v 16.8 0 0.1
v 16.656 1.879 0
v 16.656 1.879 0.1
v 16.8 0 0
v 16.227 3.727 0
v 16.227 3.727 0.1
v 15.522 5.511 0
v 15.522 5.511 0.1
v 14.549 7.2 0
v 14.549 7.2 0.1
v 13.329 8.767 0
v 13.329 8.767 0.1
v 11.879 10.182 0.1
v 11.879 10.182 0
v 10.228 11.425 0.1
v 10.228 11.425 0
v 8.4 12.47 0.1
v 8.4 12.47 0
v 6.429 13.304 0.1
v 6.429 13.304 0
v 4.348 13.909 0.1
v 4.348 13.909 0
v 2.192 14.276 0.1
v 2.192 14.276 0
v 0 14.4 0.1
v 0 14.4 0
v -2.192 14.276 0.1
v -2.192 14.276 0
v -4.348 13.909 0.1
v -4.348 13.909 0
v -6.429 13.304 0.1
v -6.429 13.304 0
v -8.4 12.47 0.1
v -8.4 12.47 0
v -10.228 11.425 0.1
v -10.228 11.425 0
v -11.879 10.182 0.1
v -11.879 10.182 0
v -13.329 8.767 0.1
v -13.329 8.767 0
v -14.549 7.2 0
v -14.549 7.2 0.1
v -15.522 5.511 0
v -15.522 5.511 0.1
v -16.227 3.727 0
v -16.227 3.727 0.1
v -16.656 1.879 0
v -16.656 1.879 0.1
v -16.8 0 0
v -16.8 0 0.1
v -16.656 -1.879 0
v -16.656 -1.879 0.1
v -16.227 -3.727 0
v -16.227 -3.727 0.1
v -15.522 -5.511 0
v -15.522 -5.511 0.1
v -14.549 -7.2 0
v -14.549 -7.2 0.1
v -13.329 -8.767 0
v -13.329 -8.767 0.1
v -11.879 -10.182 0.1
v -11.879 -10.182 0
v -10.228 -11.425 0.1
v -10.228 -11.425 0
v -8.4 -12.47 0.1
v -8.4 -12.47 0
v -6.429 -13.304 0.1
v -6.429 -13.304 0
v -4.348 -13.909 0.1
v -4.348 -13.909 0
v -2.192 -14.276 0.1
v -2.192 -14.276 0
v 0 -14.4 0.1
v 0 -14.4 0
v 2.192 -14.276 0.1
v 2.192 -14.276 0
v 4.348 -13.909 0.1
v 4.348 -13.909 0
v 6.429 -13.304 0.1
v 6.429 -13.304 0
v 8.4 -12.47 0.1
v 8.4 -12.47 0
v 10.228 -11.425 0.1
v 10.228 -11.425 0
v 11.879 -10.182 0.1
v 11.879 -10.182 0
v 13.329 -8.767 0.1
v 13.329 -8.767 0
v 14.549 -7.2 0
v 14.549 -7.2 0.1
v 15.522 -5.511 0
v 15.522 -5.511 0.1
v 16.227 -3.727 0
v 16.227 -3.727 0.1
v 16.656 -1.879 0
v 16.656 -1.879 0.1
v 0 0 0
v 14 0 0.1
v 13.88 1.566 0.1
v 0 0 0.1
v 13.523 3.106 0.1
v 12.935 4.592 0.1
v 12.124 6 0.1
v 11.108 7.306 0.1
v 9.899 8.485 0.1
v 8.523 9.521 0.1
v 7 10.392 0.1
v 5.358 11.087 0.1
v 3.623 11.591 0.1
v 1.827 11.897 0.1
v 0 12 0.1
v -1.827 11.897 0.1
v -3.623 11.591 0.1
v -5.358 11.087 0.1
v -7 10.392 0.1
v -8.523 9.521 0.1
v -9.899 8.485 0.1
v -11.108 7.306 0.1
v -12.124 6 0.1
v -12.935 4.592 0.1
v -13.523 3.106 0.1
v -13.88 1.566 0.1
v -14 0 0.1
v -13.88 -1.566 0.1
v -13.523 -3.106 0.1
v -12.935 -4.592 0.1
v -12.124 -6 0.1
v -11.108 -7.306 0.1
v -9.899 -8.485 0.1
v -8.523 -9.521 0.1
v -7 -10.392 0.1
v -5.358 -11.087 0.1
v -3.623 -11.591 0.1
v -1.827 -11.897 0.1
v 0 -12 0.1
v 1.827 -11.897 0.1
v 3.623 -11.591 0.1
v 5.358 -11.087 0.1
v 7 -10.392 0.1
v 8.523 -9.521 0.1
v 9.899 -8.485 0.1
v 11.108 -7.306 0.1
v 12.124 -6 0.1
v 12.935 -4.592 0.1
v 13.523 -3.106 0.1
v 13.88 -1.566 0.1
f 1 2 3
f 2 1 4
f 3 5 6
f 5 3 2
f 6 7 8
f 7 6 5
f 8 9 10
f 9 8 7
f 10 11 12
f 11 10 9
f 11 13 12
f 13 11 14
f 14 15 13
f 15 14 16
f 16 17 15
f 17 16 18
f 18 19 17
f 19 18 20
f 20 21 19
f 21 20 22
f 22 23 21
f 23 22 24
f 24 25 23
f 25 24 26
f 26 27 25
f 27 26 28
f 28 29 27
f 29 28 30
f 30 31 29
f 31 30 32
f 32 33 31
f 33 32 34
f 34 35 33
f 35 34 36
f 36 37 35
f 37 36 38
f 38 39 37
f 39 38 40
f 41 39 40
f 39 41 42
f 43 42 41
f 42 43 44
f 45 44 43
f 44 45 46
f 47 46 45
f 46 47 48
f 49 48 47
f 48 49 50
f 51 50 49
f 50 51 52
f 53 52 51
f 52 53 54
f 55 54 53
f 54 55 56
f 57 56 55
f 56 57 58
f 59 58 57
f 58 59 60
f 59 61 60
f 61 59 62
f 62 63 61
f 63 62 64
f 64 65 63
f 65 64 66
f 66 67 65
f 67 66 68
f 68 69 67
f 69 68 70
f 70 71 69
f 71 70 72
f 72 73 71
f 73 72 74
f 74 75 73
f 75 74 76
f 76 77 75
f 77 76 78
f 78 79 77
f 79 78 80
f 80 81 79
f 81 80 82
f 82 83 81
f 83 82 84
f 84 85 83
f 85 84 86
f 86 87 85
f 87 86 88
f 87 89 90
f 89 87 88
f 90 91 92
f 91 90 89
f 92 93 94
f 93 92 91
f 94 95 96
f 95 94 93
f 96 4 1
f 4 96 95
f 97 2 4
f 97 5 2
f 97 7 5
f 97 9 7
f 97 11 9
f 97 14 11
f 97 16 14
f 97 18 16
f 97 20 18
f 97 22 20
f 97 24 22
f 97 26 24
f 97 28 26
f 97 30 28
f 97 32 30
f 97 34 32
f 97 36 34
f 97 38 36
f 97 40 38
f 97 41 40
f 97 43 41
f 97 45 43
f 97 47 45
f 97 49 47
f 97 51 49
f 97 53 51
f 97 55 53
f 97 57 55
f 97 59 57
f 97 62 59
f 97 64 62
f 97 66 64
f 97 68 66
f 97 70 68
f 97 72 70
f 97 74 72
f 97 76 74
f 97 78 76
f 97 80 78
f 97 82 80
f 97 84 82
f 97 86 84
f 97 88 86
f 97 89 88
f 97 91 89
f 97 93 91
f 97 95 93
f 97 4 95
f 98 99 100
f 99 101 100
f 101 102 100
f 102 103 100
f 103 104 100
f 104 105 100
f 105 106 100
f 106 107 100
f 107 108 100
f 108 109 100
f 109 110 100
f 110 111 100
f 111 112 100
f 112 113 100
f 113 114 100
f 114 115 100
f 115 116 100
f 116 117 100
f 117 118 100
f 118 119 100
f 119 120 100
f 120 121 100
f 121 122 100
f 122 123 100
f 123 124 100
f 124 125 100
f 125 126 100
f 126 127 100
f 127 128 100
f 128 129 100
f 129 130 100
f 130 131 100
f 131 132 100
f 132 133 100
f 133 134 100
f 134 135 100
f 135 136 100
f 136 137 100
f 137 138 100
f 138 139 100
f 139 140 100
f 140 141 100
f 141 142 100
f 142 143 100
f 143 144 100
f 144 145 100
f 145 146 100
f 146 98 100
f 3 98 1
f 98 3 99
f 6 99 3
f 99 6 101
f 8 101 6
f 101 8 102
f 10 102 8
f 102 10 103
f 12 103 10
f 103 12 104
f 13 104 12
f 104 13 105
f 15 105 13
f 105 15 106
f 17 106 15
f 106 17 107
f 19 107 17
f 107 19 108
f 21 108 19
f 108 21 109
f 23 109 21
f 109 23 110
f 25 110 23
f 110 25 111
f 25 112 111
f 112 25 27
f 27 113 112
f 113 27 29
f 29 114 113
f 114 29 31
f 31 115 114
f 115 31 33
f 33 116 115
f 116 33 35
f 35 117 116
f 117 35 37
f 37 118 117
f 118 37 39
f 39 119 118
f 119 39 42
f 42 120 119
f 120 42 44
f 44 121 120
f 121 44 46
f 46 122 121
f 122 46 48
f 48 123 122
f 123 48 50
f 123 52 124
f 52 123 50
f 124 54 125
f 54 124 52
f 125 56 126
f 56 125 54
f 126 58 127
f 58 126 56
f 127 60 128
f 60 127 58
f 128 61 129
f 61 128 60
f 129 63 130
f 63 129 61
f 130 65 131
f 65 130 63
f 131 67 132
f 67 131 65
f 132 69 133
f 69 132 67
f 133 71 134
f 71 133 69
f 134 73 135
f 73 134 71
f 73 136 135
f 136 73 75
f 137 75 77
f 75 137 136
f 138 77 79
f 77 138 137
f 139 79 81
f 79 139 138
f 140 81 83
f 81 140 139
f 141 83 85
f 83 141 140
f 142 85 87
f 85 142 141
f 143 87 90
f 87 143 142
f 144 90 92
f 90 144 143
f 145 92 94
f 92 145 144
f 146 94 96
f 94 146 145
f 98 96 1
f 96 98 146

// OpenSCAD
// file: ../p/48/1-4cyli.scad
use <../../lib.scad>
function ldraw_lib__48__1_4cyli() = [
// 0 Hi-Res Cylinder 0.25
// 0 Name: 48\1-4cyli.dat
// 0 Author: Manfred Moolhuysen
// 0 !LDRAW_ORG 48_Primitive UPDATE 2009-01
// 0 !LICENSE Licensed under CC BY 2.0 and CC BY 4.0 : see CAreadme.txt
// 
// 0 BFC CERTIFY CCW
  [0,"BFC","CERTIFY"],
  [0,"BFC","CCW"],
// 
// 0 !HISTORY 1999-07-05 [PTadmin] Official Update 1999-05
// 0 !HISTORY 2002-02-28 [hafhead] Added BFC statement
// 0 !HISTORY 2002-04-25 [PTadmin] Official Update 2002-02
// 0 !HISTORY 2007-06-24 [PTadmin] Header formatted for Contributor Agreement
// 0 !HISTORY 2008-07-01 [PTadmin] Official Update 2008-01
// 0 !HISTORY 2008-07-07 [guyvivan] Made BFC'ed CCW (2005-12-06)
// 0 !HISTORY 2009-05-02 [PTadmin] Official Update 2009-01
// 
// 
// 4 16 0.9914 0 0.1305 1 0 0 1 1 0 0.9914 1 0.1305
  [4,16,0.9914,0,0.1305,1,0,0,1,1,0,0.9914,1,0.1305],
// 4 16 0.9659 0 0.2588 0.9914 0 0.1305 0.9914 1 0.1305 0.9659 1 0.2588
  [4,16,0.9659,0,0.2588,0.9914,0,0.1305,0.9914,1,0.1305,0.9659,1,0.2588],
// 4 16 0.9239 0 0.3827 0.9659 0 0.2588 0.9659 1 0.2588 0.9239 1 0.3827
  [4,16,0.9239,0,0.3827,0.9659,0,0.2588,0.9659,1,0.2588,0.9239,1,0.3827],
// 4 16 0.866 0 0.5 0.9239 0 0.3827 0.9239 1 0.3827 0.866 1 0.5
  [4,16,0.866,0,0.5,0.9239,0,0.3827,0.9239,1,0.3827,0.866,1,0.5],
// 4 16 0.7934 0 0.6088 0.866 0 0.5 0.866 1 0.5 0.7934 1 0.6088
  [4,16,0.7934,0,0.6088,0.866,0,0.5,0.866,1,0.5,0.7934,1,0.6088],
// 4 16 0.7071 0 0.7071 0.7934 0 0.6088 0.7934 1 0.6088 0.7071 1 0.7071
  [4,16,0.7071,0,0.7071,0.7934,0,0.6088,0.7934,1,0.6088,0.7071,1,0.7071],
// 4 16 0.6088 0 0.7934 0.7071 0 0.7071 0.7071 1 0.7071 0.6088 1 0.7934
  [4,16,0.6088,0,0.7934,0.7071,0,0.7071,0.7071,1,0.7071,0.6088,1,0.7934],
// 4 16 0.5 0 0.866 0.6088 0 0.7934 0.6088 1 0.7934 0.5 1 0.866
  [4,16,0.5,0,0.866,0.6088,0,0.7934,0.6088,1,0.7934,0.5,1,0.866],
// 4 16 0.3827 0 0.9239 0.5 0 0.866 0.5 1 0.866 0.3827 1 0.9239
  [4,16,0.3827,0,0.9239,0.5,0,0.866,0.5,1,0.866,0.3827,1,0.9239],
// 4 16 0.2588 0 0.9659 0.3827 0 0.9239 0.3827 1 0.9239 0.2588 1 0.9659
  [4,16,0.2588,0,0.9659,0.3827,0,0.9239,0.3827,1,0.9239,0.2588,1,0.9659],
// 4 16 0.1305 0 0.9914 0.2588 0 0.9659 0.2588 1 0.9659 0.1305 1 0.9914
  [4,16,0.1305,0,0.9914,0.2588,0,0.9659,0.2588,1,0.9659,0.1305,1,0.9914],
// 4 16 0 0 1 0.1305 0 0.9914 0.1305 1 0.9914 0 1 1
  [4,16,0,0,1,0.1305,0,0.9914,0.1305,1,0.9914,0,1,1],
// 
// 0 conditional lines
// 5 24 1 1 0 1 0 0 1 1 -1 0.9914 1 0.1305
  [5,24,1,1,0,1,0,0,1,1,-1,0.9914,1,0.1305],
// 5 24 0.9914 1 0.1305 0.9914 0 0.1305 1 1 0 0.9659 1 0.2588
  [5,24,0.9914,1,0.1305,0.9914,0,0.1305,1,1,0,0.9659,1,0.2588],
// 5 24 0.9659 1 0.2588 0.9659 0 0.2588 0.9914 1 0.1305 0.9239 1 0.3827
  [5,24,0.9659,1,0.2588,0.9659,0,0.2588,0.9914,1,0.1305,0.9239,1,0.3827],
// 5 24 0.9239 1 0.3827 0.9239 0 0.3827 0.9659 1 0.2588 0.866 1 0.5
  [5,24,0.9239,1,0.3827,0.9239,0,0.3827,0.9659,1,0.2588,0.866,1,0.5],
// 5 24 0.866 1 0.5 0.866 0 0.5 0.9239 1 0.3827 0.7934 1 0.6088
  [5,24,0.866,1,0.5,0.866,0,0.5,0.9239,1,0.3827,0.7934,1,0.6088],
// 5 24 0.7934 1 0.6088 0.7934 0 0.6088 0.866 1 0.5 0.7071 1 0.7071
  [5,24,0.7934,1,0.6088,0.7934,0,0.6088,0.866,1,0.5,0.7071,1,0.7071],
// 5 24 0.7071 1 0.7071 0.7071 0 0.7071 0.7934 1 0.6088 0.6088 1 0.7934
  [5,24,0.7071,1,0.7071,0.7071,0,0.7071,0.7934,1,0.6088,0.6088,1,0.7934],
// 5 24 0.6088 1 0.7934 0.6088 0 0.7934 0.7071 1 0.7071 0.5 1 0.866
  [5,24,0.6088,1,0.7934,0.6088,0,0.7934,0.7071,1,0.7071,0.5,1,0.866],
// 5 24 0.5 1 0.866 0.5 0 0.866 0.6088 1 0.7934 0.3827 1 0.9239
  [5,24,0.5,1,0.866,0.5,0,0.866,0.6088,1,0.7934,0.3827,1,0.9239],
// 5 24 0.3827 1 0.9239 0.3827 0 0.9239 0.5 1 0.866 0.2588 1 0.9659
  [5,24,0.3827,1,0.9239,0.3827,0,0.9239,0.5,1,0.866,0.2588,1,0.9659],
// 5 24 0.2588 1 0.9659 0.2588 0 0.9659 0.3827 1 0.9239 0.1305 1 0.9914
  [5,24,0.2588,1,0.9659,0.2588,0,0.9659,0.3827,1,0.9239,0.1305,1,0.9914],
// 5 24 0.1305 1 0.9914 0.1305 0 0.9914 0.2588 1 0.9659 0 1 1
  [5,24,0.1305,1,0.9914,0.1305,0,0.9914,0.2588,1,0.9659,0,1,1],
// 5 24 0 1 1 0 0 1 0.1305 1 0.9914 -1 1 1
  [5,24,0,1,1,0,0,1,0.1305,1,0.9914,-1,1,1],
// 
// 0 end of file
];
module ldraw_lib__48__1_4cyli(step=0, col=false, unit=2/5, alt=false, line=0.2, solid=!$preview)
    makepoly(ldraw_lib__48__1_4cyli(), step=step, col=col, unit=unit, alt=alt, line=line, solid=solid);
ldraw_lib__48__1_4cyli(line=0.2);
// file: ../p/48/4-4ring5.scad
use <../../lib.scad>
function ldraw_lib__48__4_4ring5() = [
// 0 Hi-Res Ring  5 x 1.0
// 0 Name: 48\4-4ring5.dat
// 0 Author: Guy Vivan [guyvivan]
// 0 !LDRAW_ORG 48_Primitive UPDATE 2009-03
// 0 !LICENSE Licensed under CC BY 2.0 and CC BY 4.0 : see CAreadme.txt
// 
// 0 BFC CERTIFY CCW
  [0,"BFC","CERTIFY"],
  [0,"BFC","CCW"],
// 
// 0 !HISTORY 2009-12-29 [PTadmin] Official Update 2009-03
// 
// 
// 4 16 5 0 0 6 0 0 5.9484 0 0.783 4.957 0 0.6525
  [4,16,5,0,0,6,0,0,5.9484,0,0.783,4.957,0,0.6525],
// 4 16 4.957 0 0.6525 5.9484 0 0.783 5.7954 0 1.5528 4.8295 0 1.294
  [4,16,4.957,0,0.6525,5.9484,0,0.783,5.7954,0,1.5528,4.8295,0,1.294],
// 4 16 4.8295 0 1.294 5.7954 0 1.5528 5.5434 0 2.2962 4.6195 0 1.9135
  [4,16,4.8295,0,1.294,5.7954,0,1.5528,5.5434,0,2.2962,4.6195,0,1.9135],
// 4 16 4.6195 0 1.9135 5.5434 0 2.2962 5.196 0 3 4.33 0 2.5
  [4,16,4.6195,0,1.9135,5.5434,0,2.2962,5.196,0,3,4.33,0,2.5],
// 4 16 4.33 0 2.5 5.196 0 3 4.7604 0 3.6528 3.967 0 3.044
  [4,16,4.33,0,2.5,5.196,0,3,4.7604,0,3.6528,3.967,0,3.044],
// 4 16 3.967 0 3.044 4.7604 0 3.6528 4.2426 0 4.2426 3.5355 0 3.5355
  [4,16,3.967,0,3.044,4.7604,0,3.6528,4.2426,0,4.2426,3.5355,0,3.5355],
// 4 16 3.5355 0 3.5355 4.2426 0 4.2426 3.6528 0 4.7604 3.044 0 3.967
  [4,16,3.5355,0,3.5355,4.2426,0,4.2426,3.6528,0,4.7604,3.044,0,3.967],
// 4 16 3.044 0 3.967 3.6528 0 4.7604 3 0 5.196 2.5 0 4.33
  [4,16,3.044,0,3.967,3.6528,0,4.7604,3,0,5.196,2.5,0,4.33],
// 4 16 2.5 0 4.33 3 0 5.196 2.2962 0 5.5434 1.9135 0 4.6195
  [4,16,2.5,0,4.33,3,0,5.196,2.2962,0,5.5434,1.9135,0,4.6195],
// 4 16 1.9135 0 4.6195 2.2962 0 5.5434 1.5528 0 5.7954 1.294 0 4.8295
  [4,16,1.9135,0,4.6195,2.2962,0,5.5434,1.5528,0,5.7954,1.294,0,4.8295],
// 4 16 1.294 0 4.8295 1.5528 0 5.7954 0.783 0 5.9484 0.6525 0 4.957
  [4,16,1.294,0,4.8295,1.5528,0,5.7954,0.783,0,5.9484,0.6525,0,4.957],
// 4 16 0.6525 0 4.957 0.783 0 5.9484 0 0 6 0 0 5
  [4,16,0.6525,0,4.957,0.783,0,5.9484,0,0,6,0,0,5],
// 4 16 0 0 5 0 0 6 -0.783 0 5.9484 -0.6525 0 4.957
  [4,16,0,0,5,0,0,6,-0.783,0,5.9484,-0.6525,0,4.957],
// 4 16 -0.6525 0 4.957 -0.783 0 5.9484 -1.5528 0 5.7954 -1.294 0 4.8295
  [4,16,-0.6525,0,4.957,-0.783,0,5.9484,-1.5528,0,5.7954,-1.294,0,4.8295],
// 4 16 -1.294 0 4.8295 -1.5528 0 5.7954 -2.2962 0 5.5434 -1.9135 0 4.6195
  [4,16,-1.294,0,4.8295,-1.5528,0,5.7954,-2.2962,0,5.5434,-1.9135,0,4.6195],
// 4 16 -1.9135 0 4.6195 -2.2962 0 5.5434 -3 0 5.196 -2.5 0 4.33
  [4,16,-1.9135,0,4.6195,-2.2962,0,5.5434,-3,0,5.196,-2.5,0,4.33],
// 4 16 -2.5 0 4.33 -3 0 5.196 -3.6528 0 4.7604 -3.044 0 3.967
  [4,16,-2.5,0,4.33,-3,0,5.196,-3.6528,0,4.7604,-3.044,0,3.967],
// 4 16 -3.044 0 3.967 -3.6528 0 4.7604 -4.2426 0 4.2426 -3.5355 0 3.5355
  [4,16,-3.044,0,3.967,-3.6528,0,4.7604,-4.2426,0,4.2426,-3.5355,0,3.5355],
// 4 16 -3.5355 0 3.5355 -4.2426 0 4.2426 -4.7604 0 3.6528 -3.967 0 3.044
  [4,16,-3.5355,0,3.5355,-4.2426,0,4.2426,-4.7604,0,3.6528,-3.967,0,3.044],
// 4 16 -3.967 0 3.044 -4.7604 0 3.6528 -5.196 0 3 -4.33 0 2.5
  [4,16,-3.967,0,3.044,-4.7604,0,3.6528,-5.196,0,3,-4.33,0,2.5],
// 4 16 -4.33 0 2.5 -5.196 0 3 -5.5434 0 2.2962 -4.6195 0 1.9135
  [4,16,-4.33,0,2.5,-5.196,0,3,-5.5434,0,2.2962,-4.6195,0,1.9135],
// 4 16 -4.6195 0 1.9135 -5.5434 0 2.2962 -5.7954 0 1.5528 -4.8295 0 1.294
  [4,16,-4.6195,0,1.9135,-5.5434,0,2.2962,-5.7954,0,1.5528,-4.8295,0,1.294],
// 4 16 -4.8295 0 1.294 -5.7954 0 1.5528 -5.9484 0 0.783 -4.957 0 0.6525
  [4,16,-4.8295,0,1.294,-5.7954,0,1.5528,-5.9484,0,0.783,-4.957,0,0.6525],
// 4 16 -4.957 0 0.6525 -5.9484 0 0.783 -6 0 0 -5 0 0
  [4,16,-4.957,0,0.6525,-5.9484,0,0.783,-6,0,0,-5,0,0],
// 4 16 -5 0 0 -6 0 0 -5.9484 0 -0.783 -4.957 0 -0.6525
  [4,16,-5,0,0,-6,0,0,-5.9484,0,-0.783,-4.957,0,-0.6525],
// 4 16 -4.957 0 -0.6525 -5.9484 0 -0.783 -5.7954 0 -1.5528 -4.8295 0 -1.294
  [4,16,-4.957,0,-0.6525,-5.9484,0,-0.783,-5.7954,0,-1.5528,-4.8295,0,-1.294],
// 4 16 -4.8295 0 -1.294 -5.7954 0 -1.5528 -5.5434 0 -2.2962 -4.6195 0 -1.9135
  [4,16,-4.8295,0,-1.294,-5.7954,0,-1.5528,-5.5434,0,-2.2962,-4.6195,0,-1.9135],
// 4 16 -4.6195 0 -1.9135 -5.5434 0 -2.2962 -5.196 0 -3 -4.33 0 -2.5
  [4,16,-4.6195,0,-1.9135,-5.5434,0,-2.2962,-5.196,0,-3,-4.33,0,-2.5],
// 4 16 -4.33 0 -2.5 -5.196 0 -3 -4.7604 0 -3.6528 -3.967 0 -3.044
  [4,16,-4.33,0,-2.5,-5.196,0,-3,-4.7604,0,-3.6528,-3.967,0,-3.044],
// 4 16 -3.967 0 -3.044 -4.7604 0 -3.6528 -4.2426 0 -4.2426 -3.5355 0 -3.5355
  [4,16,-3.967,0,-3.044,-4.7604,0,-3.6528,-4.2426,0,-4.2426,-3.5355,0,-3.5355],
// 4 16 -3.5355 0 -3.5355 -4.2426 0 -4.2426 -3.6528 0 -4.7604 -3.044 0 -3.967
  [4,16,-3.5355,0,-3.5355,-4.2426,0,-4.2426,-3.6528,0,-4.7604,-3.044,0,-3.967],
// 4 16 -3.044 0 -3.967 -3.6528 0 -4.7604 -3 0 -5.196 -2.5 0 -4.33
  [4,16,-3.044,0,-3.967,-3.6528,0,-4.7604,-3,0,-5.196,-2.5,0,-4.33],
// 4 16 -2.5 0 -4.33 -3 0 -5.196 -2.2962 0 -5.5434 -1.9135 0 -4.6195
  [4,16,-2.5,0,-4.33,-3,0,-5.196,-2.2962,0,-5.5434,-1.9135,0,-4.6195],
// 4 16 -1.9135 0 -4.6195 -2.2962 0 -5.5434 -1.5528 0 -5.7954 -1.294 0 -4.8295
  [4,16,-1.9135,0,-4.6195,-2.2962,0,-5.5434,-1.5528,0,-5.7954,-1.294,0,-4.8295],
// 4 16 -1.294 0 -4.8295 -1.5528 0 -5.7954 -0.783 0 -5.9484 -0.6525 0 -4.957
  [4,16,-1.294,0,-4.8295,-1.5528,0,-5.7954,-0.783,0,-5.9484,-0.6525,0,-4.957],
// 4 16 -0.6525 0 -4.957 -0.783 0 -5.9484 0 0 -6 0 0 -5
  [4,16,-0.6525,0,-4.957,-0.783,0,-5.9484,0,0,-6,0,0,-5],
// 4 16 0 0 -5 0 0 -6 0.783 0 -5.9484 0.6525 0 -4.957
  [4,16,0,0,-5,0,0,-6,0.783,0,-5.9484,0.6525,0,-4.957],
// 4 16 0.6525 0 -4.957 0.783 0 -5.9484 1.5528 0 -5.7954 1.294 0 -4.8295
  [4,16,0.6525,0,-4.957,0.783,0,-5.9484,1.5528,0,-5.7954,1.294,0,-4.8295],
// 4 16 1.294 0 -4.8295 1.5528 0 -5.7954 2.2962 0 -5.5434 1.9135 0 -4.6195
  [4,16,1.294,0,-4.8295,1.5528,0,-5.7954,2.2962,0,-5.5434,1.9135,0,-4.6195],
// 4 16 1.9135 0 -4.6195 2.2962 0 -5.5434 3 0 -5.196 2.5 0 -4.33
  [4,16,1.9135,0,-4.6195,2.2962,0,-5.5434,3,0,-5.196,2.5,0,-4.33],
// 4 16 2.5 0 -4.33 3 0 -5.196 3.6528 0 -4.7604 3.044 0 -3.967
  [4,16,2.5,0,-4.33,3,0,-5.196,3.6528,0,-4.7604,3.044,0,-3.967],
// 4 16 3.044 0 -3.967 3.6528 0 -4.7604 4.2426 0 -4.2426 3.5355 0 -3.5355
  [4,16,3.044,0,-3.967,3.6528,0,-4.7604,4.2426,0,-4.2426,3.5355,0,-3.5355],
// 4 16 3.5355 0 -3.5355 4.2426 0 -4.2426 4.7604 0 -3.6528 3.967 0 -3.044
  [4,16,3.5355,0,-3.5355,4.2426,0,-4.2426,4.7604,0,-3.6528,3.967,0,-3.044],
// 4 16 3.967 0 -3.044 4.7604 0 -3.6528 5.196 0 -3 4.33 0 -2.5
  [4,16,3.967,0,-3.044,4.7604,0,-3.6528,5.196,0,-3,4.33,0,-2.5],
// 4 16 4.33 0 -2.5 5.196 0 -3 5.5434 0 -2.2962 4.6195 0 -1.9135
  [4,16,4.33,0,-2.5,5.196,0,-3,5.5434,0,-2.2962,4.6195,0,-1.9135],
// 4 16 4.6195 0 -1.9135 5.5434 0 -2.2962 5.7954 0 -1.5528 4.8295 0 -1.294
  [4,16,4.6195,0,-1.9135,5.5434,0,-2.2962,5.7954,0,-1.5528,4.8295,0,-1.294],
// 4 16 4.8295 0 -1.294 5.7954 0 -1.5528 5.9484 0 -0.783 4.957 0 -0.6525
  [4,16,4.8295,0,-1.294,5.7954,0,-1.5528,5.9484,0,-0.783,4.957,0,-0.6525],
// 4 16 4.957 0 -0.6525 5.9484 0 -0.783 6 0 0 5 0 0
  [4,16,4.957,0,-0.6525,5.9484,0,-0.783,6,0,0,5,0,0],
// 
// 0 end of file
// 
];
module ldraw_lib__48__4_4ring5(step=0, col=false, unit=2/5, alt=false, line=0.2, solid=!$preview)
    makepoly(ldraw_lib__48__4_4ring5(), step=step, col=col, unit=unit, alt=alt, line=line, solid=solid);
ldraw_lib__48__4_4ring5(line=0.2);
// file: ../p/48/4-4disc.scad
use <../../lib.scad>
function ldraw_lib__48__4_4disc() = [
// 0 Hi-Res Disc 1.0
// 0 Name: 48\4-4disc.dat
// 0 Author: Miklos Hosszu [hmick]
// 0 !LDRAW_ORG 48_Primitive UPDATE 2012-02
// 0 !LICENSE Licensed under CC BY 2.0 and CC BY 4.0 : see CAreadme.txt
// 
// 0 BFC CERTIFY CCW
  [0,"BFC","CERTIFY"],
  [0,"BFC","CCW"],
// 
// 0 !HISTORY 2004-11-06 [PTadmin] Official Update 2004-04
// 0 !HISTORY 2007-06-24 [PTadmin] Header formatted for Contributor Agreement
// 0 !HISTORY 2008-07-01 [PTadmin] Official Update 2008-01
// 0 !HISTORY 2012-02-27 [Philo] Changed to CCW
// 0 !HISTORY 2012-08-09 [PTadmin] Official Update 2012-02
// 
// 
// 3 16 1 0 0 0.9914 0 0.1305 0 0 0
  [3,16,1,0,0,0.9914,0,0.1305,0,0,0],
// 3 16 0.9914 0 0.1305 0.9659 0 0.2588 0 0 0
  [3,16,0.9914,0,0.1305,0.9659,0,0.2588,0,0,0],
// 3 16 0.9659 0 0.2588 0.9239 0 0.3827 0 0 0
  [3,16,0.9659,0,0.2588,0.9239,0,0.3827,0,0,0],
// 3 16 0.9239 0 0.3827 0.866 0 0.5 0 0 0
  [3,16,0.9239,0,0.3827,0.866,0,0.5,0,0,0],
// 3 16 0.866 0 0.5 0.7934 0 0.6088 0 0 0
  [3,16,0.866,0,0.5,0.7934,0,0.6088,0,0,0],
// 3 16 0.7934 0 0.6088 0.7071 0 0.7071 0 0 0
  [3,16,0.7934,0,0.6088,0.7071,0,0.7071,0,0,0],
// 3 16 0.7071 0 0.7071 0.6088 0 0.7934 0 0 0
  [3,16,0.7071,0,0.7071,0.6088,0,0.7934,0,0,0],
// 3 16 0.6088 0 0.7934 0.5 0 0.866 0 0 0
  [3,16,0.6088,0,0.7934,0.5,0,0.866,0,0,0],
// 3 16 0.5 0 0.866 0.3827 0 0.9239 0 0 0
  [3,16,0.5,0,0.866,0.3827,0,0.9239,0,0,0],
// 3 16 0.3827 0 0.9239 0.2588 0 0.9659 0 0 0
  [3,16,0.3827,0,0.9239,0.2588,0,0.9659,0,0,0],
// 3 16 0.2588 0 0.9659 0.1305 0 0.9914 0 0 0
  [3,16,0.2588,0,0.9659,0.1305,0,0.9914,0,0,0],
// 3 16 0.1305 0 0.9914 0 0 1 0 0 0
  [3,16,0.1305,0,0.9914,0,0,1,0,0,0],
// 3 16 0 0 1 -0.1305 0 0.9914 0 0 0
  [3,16,0,0,1,-0.1305,0,0.9914,0,0,0],
// 3 16 -0.1305 0 0.9914 -0.2588 0 0.9659 0 0 0
  [3,16,-0.1305,0,0.9914,-0.2588,0,0.9659,0,0,0],
// 3 16 -0.2588 0 0.9659 -0.3827 0 0.9239 0 0 0
  [3,16,-0.2588,0,0.9659,-0.3827,0,0.9239,0,0,0],
// 3 16 -0.3827 0 0.9239 -0.5 0 0.866 0 0 0
  [3,16,-0.3827,0,0.9239,-0.5,0,0.866,0,0,0],
// 3 16 -0.5 0 0.866 -0.6088 0 0.7934 0 0 0
  [3,16,-0.5,0,0.866,-0.6088,0,0.7934,0,0,0],
// 3 16 -0.6088 0 0.7934 -0.7071 0 0.7071 0 0 0
  [3,16,-0.6088,0,0.7934,-0.7071,0,0.7071,0,0,0],
// 3 16 -0.7071 0 0.7071 -0.7934 0 0.6088 0 0 0
  [3,16,-0.7071,0,0.7071,-0.7934,0,0.6088,0,0,0],
// 3 16 -0.7934 0 0.6088 -0.866 0 0.5 0 0 0
  [3,16,-0.7934,0,0.6088,-0.866,0,0.5,0,0,0],
// 3 16 -0.866 0 0.5 -0.9239 0 0.3827 0 0 0
  [3,16,-0.866,0,0.5,-0.9239,0,0.3827,0,0,0],
// 3 16 -0.9239 0 0.3827 -0.9659 0 0.2588 0 0 0
  [3,16,-0.9239,0,0.3827,-0.9659,0,0.2588,0,0,0],
// 3 16 -0.9659 0 0.2588 -0.9914 0 0.1305 0 0 0
  [3,16,-0.9659,0,0.2588,-0.9914,0,0.1305,0,0,0],
// 3 16 -0.9914 0 0.1305 -1 0 0 0 0 0
  [3,16,-0.9914,0,0.1305,-1,0,0,0,0,0],
// 3 16 -1 0 0 -0.9914 0 -0.1305 0 0 0
  [3,16,-1,0,0,-0.9914,0,-0.1305,0,0,0],
// 3 16 -0.9914 0 -0.1305 -0.9659 0 -0.2588 0 0 0
  [3,16,-0.9914,0,-0.1305,-0.9659,0,-0.2588,0,0,0],
// 3 16 -0.9659 0 -0.2588 -0.9239 0 -0.3827 0 0 0
  [3,16,-0.9659,0,-0.2588,-0.9239,0,-0.3827,0,0,0],
// 3 16 -0.9239 0 -0.3827 -0.866 0 -0.5 0 0 0
  [3,16,-0.9239,0,-0.3827,-0.866,0,-0.5,0,0,0],
// 3 16 -0.866 0 -0.5 -0.7934 0 -0.6088 0 0 0
  [3,16,-0.866,0,-0.5,-0.7934,0,-0.6088,0,0,0],
// 3 16 -0.7934 0 -0.6088 -0.7071 0 -0.7071 0 0 0
  [3,16,-0.7934,0,-0.6088,-0.7071,0,-0.7071,0,0,0],
// 3 16 -0.7071 0 -0.7071 -0.6088 0 -0.7934 0 0 0
  [3,16,-0.7071,0,-0.7071,-0.6088,0,-0.7934,0,0,0],
// 3 16 -0.6088 0 -0.7934 -0.5 0 -0.866 0 0 0
  [3,16,-0.6088,0,-0.7934,-0.5,0,-0.866,0,0,0],
// 3 16 -0.5 0 -0.866 -0.3827 0 -0.9239 0 0 0
  [3,16,-0.5,0,-0.866,-0.3827,0,-0.9239,0,0,0],
// 3 16 -0.3827 0 -0.9239 -0.2588 0 -0.9659 0 0 0
  [3,16,-0.3827,0,-0.9239,-0.2588,0,-0.9659,0,0,0],
// 3 16 -0.2588 0 -0.9659 -0.1305 0 -0.9914 0 0 0
  [3,16,-0.2588,0,-0.9659,-0.1305,0,-0.9914,0,0,0],
// 3 16 -0.1305 0 -0.9914 0 0 -1 0 0 0
  [3,16,-0.1305,0,-0.9914,0,0,-1,0,0,0],
// 3 16 0 0 -1 0.1305 0 -0.9914 0 0 0
  [3,16,0,0,-1,0.1305,0,-0.9914,0,0,0],
// 3 16 0.1305 0 -0.9914 0.2588 0 -0.9659 0 0 0
  [3,16,0.1305,0,-0.9914,0.2588,0,-0.9659,0,0,0],
// 3 16 0.2588 0 -0.9659 0.3827 0 -0.9239 0 0 0
  [3,16,0.2588,0,-0.9659,0.3827,0,-0.9239,0,0,0],
// 3 16 0.3827 0 -0.9239 0.5 0 -0.866 0 0 0
  [3,16,0.3827,0,-0.9239,0.5,0,-0.866,0,0,0],
// 3 16 0.5 0 -0.866 0.6088 0 -0.7934 0 0 0
  [3,16,0.5,0,-0.866,0.6088,0,-0.7934,0,0,0],
// 3 16 0.6088 0 -0.7934 0.7071 0 -0.7071 0 0 0
  [3,16,0.6088,0,-0.7934,0.7071,0,-0.7071,0,0,0],
// 3 16 0.7071 0 -0.7071 0.7934 0 -0.6088 0 0 0
  [3,16,0.7071,0,-0.7071,0.7934,0,-0.6088,0,0,0],
// 3 16 0.7934 0 -0.6088 0.866 0 -0.5 0 0 0
  [3,16,0.7934,0,-0.6088,0.866,0,-0.5,0,0,0],
// 3 16 0.866 0 -0.5 0.9239 0 -0.3827 0 0 0
  [3,16,0.866,0,-0.5,0.9239,0,-0.3827,0,0,0],
// 3 16 0.9239 0 -0.3827 0.9659 0 -0.2588 0 0 0
  [3,16,0.9239,0,-0.3827,0.9659,0,-0.2588,0,0,0],
// 3 16 0.9659 0 -0.2588 0.9914 0 -0.1305 0 0 0
  [3,16,0.9659,0,-0.2588,0.9914,0,-0.1305,0,0,0],
// 3 16 0.9914 0 -0.1305 1 0 0 0 0 0
  [3,16,0.9914,0,-0.1305,1,0,0,0,0,0],
];
module ldraw_lib__48__4_4disc(step=0, col=false, unit=2/5, alt=false, line=0.2, solid=!$preview)
    makepoly(ldraw_lib__48__4_4disc(), step=step, col=col, unit=unit, alt=alt, line=line, solid=solid);
ldraw_lib__48__4_4disc(line=0.2);
// file: ../p/48/4-4cyli.scad
use <../../lib.scad>
use <1-4cyli.scad>
function ldraw_lib__48__4_4cyli() = [
// 0 Hi-Res Cylinder 1.0
// 0 Name: 48\4-4cyli.dat
// 0 Author: Paul Easter [pneaster]
// 0 !LDRAW_ORG 48_Primitive UPDATE 2012-02
// 0 !LICENSE Licensed under CC BY 2.0 and CC BY 4.0 : see CAreadme.txt
// 
// 0 BFC CERTIFY CCW
  [0,"BFC","CERTIFY"],
  [0,"BFC","CCW"],
// 
// 0 !HISTORY 2002-08-18 [PTadmin] Official Update 2002-04
// 0 !HISTORY 2007-06-24 [PTadmin] Header formatted for Contributor Agreement
// 0 !HISTORY 2008-07-01 [PTadmin] Official Update 2008-01
// 0 !HISTORY 2012-02-27 [Philo] Changed to CCW
// 0 !HISTORY 2012-08-09 [PTadmin] Official Update 2012-02
// 
// 
// 1 16 0 0 0 1 0 0 0 1 0 0 0 1 48\1-4cyli.dat
  [1,16,0,0,0,1,0,0,0,1,0,0,0,1, ldraw_lib__48__1_4cyli()],
// 1 16 0 0 0 0 0 -1 0 1 0 1 0 0 48\1-4cyli.dat
  [1,16,0,0,0,0,0,-1,0,1,0,1,0,0, ldraw_lib__48__1_4cyli()],
// 1 16 0 0 0 -1 0 0 0 1 0 0 0 -1 48\1-4cyli.dat
  [1,16,0,0,0,-1,0,0,0,1,0,0,0,-1, ldraw_lib__48__1_4cyli()],
// 1 16 0 0 0 0 0 1 0 1 0 -1 0 0 48\1-4cyli.dat
  [1,16,0,0,0,0,0,1,0,1,0,-1,0,0, ldraw_lib__48__1_4cyli()],
];
module ldraw_lib__48__4_4cyli(step=0, col=false, unit=2/5, alt=false, line=0.2, solid=!$preview)
    makepoly(ldraw_lib__48__4_4cyli(), step=step, col=col, unit=unit, alt=alt, line=line, solid=solid);
ldraw_lib__48__4_4cyli(line=0.2);
// main file
use <../lib.scad>
use <../p/48/4-4cyli.scad>
use <../p/48/4-4disc.scad>
use <../p/48/4-4ring5.scad>
function ldraw_lib__190085a() = [
// 0 Sticker  3.6 x  4 Oval Mirror with Red Frame
// 0 Name: 190085a.dat
// 0 Author: Philippe Hurbain [Philo]
// 0 !LDRAW_ORG Part UPDATE 2019-01
// 0 !LICENSE Licensed under CC BY 2.0 and CC BY 4.0 : see CAreadme.txt
// 
// 0 BFC CERTIFY CCW
  [0,"BFC","CERTIFY"],
  [0,"BFC","CCW"],
// 
// 0 !KEYWORDS Bathroom, Homemaker, Set 261-1
// 
// 0 !HISTORY 2019-06-28 [PTadmin] Official Update 2019-01
// 
// 
// 1 16 0 0 0 42 0 0 0 -.25 0 0 0 36 48\4-4cyli.dat
  [1,16,0,0,0,42,0,0,0,-.25,0,0,0,36, ldraw_lib__48__4_4cyli()],
// 1 16 0 0 0 42 0 0 0 -1 0 0 0 36 48\4-4disc.dat
  [1,16,0,0,0,42,0,0,0,-1,0,0,0,36, ldraw_lib__48__4_4disc()],
// 1 383 0 -.25 0 35 0 0 0 1 0 0 0 30 48\4-4disc.dat
  [1,383,0,-.25,0,35,0,0,0,1,0,0,0,30, ldraw_lib__48__4_4disc()],
// 1 4 0 -.25 0 7 0 0 0 1 0 0 0 6 48\4-4ring5.dat
  [1,4,0,-.25,0,7,0,0,0,1,0,0,0,6, ldraw_lib__48__4_4ring5()],
];
module ldraw_lib__190085a(step=0, col=false, unit=2/5, alt=false, line=0.2, solid=!$preview)
    makepoly(ldraw_lib__190085a(), step=step, col=col, unit=unit, alt=alt, line=line, solid=solid);
ldraw_lib__190085a(line=0.2);
